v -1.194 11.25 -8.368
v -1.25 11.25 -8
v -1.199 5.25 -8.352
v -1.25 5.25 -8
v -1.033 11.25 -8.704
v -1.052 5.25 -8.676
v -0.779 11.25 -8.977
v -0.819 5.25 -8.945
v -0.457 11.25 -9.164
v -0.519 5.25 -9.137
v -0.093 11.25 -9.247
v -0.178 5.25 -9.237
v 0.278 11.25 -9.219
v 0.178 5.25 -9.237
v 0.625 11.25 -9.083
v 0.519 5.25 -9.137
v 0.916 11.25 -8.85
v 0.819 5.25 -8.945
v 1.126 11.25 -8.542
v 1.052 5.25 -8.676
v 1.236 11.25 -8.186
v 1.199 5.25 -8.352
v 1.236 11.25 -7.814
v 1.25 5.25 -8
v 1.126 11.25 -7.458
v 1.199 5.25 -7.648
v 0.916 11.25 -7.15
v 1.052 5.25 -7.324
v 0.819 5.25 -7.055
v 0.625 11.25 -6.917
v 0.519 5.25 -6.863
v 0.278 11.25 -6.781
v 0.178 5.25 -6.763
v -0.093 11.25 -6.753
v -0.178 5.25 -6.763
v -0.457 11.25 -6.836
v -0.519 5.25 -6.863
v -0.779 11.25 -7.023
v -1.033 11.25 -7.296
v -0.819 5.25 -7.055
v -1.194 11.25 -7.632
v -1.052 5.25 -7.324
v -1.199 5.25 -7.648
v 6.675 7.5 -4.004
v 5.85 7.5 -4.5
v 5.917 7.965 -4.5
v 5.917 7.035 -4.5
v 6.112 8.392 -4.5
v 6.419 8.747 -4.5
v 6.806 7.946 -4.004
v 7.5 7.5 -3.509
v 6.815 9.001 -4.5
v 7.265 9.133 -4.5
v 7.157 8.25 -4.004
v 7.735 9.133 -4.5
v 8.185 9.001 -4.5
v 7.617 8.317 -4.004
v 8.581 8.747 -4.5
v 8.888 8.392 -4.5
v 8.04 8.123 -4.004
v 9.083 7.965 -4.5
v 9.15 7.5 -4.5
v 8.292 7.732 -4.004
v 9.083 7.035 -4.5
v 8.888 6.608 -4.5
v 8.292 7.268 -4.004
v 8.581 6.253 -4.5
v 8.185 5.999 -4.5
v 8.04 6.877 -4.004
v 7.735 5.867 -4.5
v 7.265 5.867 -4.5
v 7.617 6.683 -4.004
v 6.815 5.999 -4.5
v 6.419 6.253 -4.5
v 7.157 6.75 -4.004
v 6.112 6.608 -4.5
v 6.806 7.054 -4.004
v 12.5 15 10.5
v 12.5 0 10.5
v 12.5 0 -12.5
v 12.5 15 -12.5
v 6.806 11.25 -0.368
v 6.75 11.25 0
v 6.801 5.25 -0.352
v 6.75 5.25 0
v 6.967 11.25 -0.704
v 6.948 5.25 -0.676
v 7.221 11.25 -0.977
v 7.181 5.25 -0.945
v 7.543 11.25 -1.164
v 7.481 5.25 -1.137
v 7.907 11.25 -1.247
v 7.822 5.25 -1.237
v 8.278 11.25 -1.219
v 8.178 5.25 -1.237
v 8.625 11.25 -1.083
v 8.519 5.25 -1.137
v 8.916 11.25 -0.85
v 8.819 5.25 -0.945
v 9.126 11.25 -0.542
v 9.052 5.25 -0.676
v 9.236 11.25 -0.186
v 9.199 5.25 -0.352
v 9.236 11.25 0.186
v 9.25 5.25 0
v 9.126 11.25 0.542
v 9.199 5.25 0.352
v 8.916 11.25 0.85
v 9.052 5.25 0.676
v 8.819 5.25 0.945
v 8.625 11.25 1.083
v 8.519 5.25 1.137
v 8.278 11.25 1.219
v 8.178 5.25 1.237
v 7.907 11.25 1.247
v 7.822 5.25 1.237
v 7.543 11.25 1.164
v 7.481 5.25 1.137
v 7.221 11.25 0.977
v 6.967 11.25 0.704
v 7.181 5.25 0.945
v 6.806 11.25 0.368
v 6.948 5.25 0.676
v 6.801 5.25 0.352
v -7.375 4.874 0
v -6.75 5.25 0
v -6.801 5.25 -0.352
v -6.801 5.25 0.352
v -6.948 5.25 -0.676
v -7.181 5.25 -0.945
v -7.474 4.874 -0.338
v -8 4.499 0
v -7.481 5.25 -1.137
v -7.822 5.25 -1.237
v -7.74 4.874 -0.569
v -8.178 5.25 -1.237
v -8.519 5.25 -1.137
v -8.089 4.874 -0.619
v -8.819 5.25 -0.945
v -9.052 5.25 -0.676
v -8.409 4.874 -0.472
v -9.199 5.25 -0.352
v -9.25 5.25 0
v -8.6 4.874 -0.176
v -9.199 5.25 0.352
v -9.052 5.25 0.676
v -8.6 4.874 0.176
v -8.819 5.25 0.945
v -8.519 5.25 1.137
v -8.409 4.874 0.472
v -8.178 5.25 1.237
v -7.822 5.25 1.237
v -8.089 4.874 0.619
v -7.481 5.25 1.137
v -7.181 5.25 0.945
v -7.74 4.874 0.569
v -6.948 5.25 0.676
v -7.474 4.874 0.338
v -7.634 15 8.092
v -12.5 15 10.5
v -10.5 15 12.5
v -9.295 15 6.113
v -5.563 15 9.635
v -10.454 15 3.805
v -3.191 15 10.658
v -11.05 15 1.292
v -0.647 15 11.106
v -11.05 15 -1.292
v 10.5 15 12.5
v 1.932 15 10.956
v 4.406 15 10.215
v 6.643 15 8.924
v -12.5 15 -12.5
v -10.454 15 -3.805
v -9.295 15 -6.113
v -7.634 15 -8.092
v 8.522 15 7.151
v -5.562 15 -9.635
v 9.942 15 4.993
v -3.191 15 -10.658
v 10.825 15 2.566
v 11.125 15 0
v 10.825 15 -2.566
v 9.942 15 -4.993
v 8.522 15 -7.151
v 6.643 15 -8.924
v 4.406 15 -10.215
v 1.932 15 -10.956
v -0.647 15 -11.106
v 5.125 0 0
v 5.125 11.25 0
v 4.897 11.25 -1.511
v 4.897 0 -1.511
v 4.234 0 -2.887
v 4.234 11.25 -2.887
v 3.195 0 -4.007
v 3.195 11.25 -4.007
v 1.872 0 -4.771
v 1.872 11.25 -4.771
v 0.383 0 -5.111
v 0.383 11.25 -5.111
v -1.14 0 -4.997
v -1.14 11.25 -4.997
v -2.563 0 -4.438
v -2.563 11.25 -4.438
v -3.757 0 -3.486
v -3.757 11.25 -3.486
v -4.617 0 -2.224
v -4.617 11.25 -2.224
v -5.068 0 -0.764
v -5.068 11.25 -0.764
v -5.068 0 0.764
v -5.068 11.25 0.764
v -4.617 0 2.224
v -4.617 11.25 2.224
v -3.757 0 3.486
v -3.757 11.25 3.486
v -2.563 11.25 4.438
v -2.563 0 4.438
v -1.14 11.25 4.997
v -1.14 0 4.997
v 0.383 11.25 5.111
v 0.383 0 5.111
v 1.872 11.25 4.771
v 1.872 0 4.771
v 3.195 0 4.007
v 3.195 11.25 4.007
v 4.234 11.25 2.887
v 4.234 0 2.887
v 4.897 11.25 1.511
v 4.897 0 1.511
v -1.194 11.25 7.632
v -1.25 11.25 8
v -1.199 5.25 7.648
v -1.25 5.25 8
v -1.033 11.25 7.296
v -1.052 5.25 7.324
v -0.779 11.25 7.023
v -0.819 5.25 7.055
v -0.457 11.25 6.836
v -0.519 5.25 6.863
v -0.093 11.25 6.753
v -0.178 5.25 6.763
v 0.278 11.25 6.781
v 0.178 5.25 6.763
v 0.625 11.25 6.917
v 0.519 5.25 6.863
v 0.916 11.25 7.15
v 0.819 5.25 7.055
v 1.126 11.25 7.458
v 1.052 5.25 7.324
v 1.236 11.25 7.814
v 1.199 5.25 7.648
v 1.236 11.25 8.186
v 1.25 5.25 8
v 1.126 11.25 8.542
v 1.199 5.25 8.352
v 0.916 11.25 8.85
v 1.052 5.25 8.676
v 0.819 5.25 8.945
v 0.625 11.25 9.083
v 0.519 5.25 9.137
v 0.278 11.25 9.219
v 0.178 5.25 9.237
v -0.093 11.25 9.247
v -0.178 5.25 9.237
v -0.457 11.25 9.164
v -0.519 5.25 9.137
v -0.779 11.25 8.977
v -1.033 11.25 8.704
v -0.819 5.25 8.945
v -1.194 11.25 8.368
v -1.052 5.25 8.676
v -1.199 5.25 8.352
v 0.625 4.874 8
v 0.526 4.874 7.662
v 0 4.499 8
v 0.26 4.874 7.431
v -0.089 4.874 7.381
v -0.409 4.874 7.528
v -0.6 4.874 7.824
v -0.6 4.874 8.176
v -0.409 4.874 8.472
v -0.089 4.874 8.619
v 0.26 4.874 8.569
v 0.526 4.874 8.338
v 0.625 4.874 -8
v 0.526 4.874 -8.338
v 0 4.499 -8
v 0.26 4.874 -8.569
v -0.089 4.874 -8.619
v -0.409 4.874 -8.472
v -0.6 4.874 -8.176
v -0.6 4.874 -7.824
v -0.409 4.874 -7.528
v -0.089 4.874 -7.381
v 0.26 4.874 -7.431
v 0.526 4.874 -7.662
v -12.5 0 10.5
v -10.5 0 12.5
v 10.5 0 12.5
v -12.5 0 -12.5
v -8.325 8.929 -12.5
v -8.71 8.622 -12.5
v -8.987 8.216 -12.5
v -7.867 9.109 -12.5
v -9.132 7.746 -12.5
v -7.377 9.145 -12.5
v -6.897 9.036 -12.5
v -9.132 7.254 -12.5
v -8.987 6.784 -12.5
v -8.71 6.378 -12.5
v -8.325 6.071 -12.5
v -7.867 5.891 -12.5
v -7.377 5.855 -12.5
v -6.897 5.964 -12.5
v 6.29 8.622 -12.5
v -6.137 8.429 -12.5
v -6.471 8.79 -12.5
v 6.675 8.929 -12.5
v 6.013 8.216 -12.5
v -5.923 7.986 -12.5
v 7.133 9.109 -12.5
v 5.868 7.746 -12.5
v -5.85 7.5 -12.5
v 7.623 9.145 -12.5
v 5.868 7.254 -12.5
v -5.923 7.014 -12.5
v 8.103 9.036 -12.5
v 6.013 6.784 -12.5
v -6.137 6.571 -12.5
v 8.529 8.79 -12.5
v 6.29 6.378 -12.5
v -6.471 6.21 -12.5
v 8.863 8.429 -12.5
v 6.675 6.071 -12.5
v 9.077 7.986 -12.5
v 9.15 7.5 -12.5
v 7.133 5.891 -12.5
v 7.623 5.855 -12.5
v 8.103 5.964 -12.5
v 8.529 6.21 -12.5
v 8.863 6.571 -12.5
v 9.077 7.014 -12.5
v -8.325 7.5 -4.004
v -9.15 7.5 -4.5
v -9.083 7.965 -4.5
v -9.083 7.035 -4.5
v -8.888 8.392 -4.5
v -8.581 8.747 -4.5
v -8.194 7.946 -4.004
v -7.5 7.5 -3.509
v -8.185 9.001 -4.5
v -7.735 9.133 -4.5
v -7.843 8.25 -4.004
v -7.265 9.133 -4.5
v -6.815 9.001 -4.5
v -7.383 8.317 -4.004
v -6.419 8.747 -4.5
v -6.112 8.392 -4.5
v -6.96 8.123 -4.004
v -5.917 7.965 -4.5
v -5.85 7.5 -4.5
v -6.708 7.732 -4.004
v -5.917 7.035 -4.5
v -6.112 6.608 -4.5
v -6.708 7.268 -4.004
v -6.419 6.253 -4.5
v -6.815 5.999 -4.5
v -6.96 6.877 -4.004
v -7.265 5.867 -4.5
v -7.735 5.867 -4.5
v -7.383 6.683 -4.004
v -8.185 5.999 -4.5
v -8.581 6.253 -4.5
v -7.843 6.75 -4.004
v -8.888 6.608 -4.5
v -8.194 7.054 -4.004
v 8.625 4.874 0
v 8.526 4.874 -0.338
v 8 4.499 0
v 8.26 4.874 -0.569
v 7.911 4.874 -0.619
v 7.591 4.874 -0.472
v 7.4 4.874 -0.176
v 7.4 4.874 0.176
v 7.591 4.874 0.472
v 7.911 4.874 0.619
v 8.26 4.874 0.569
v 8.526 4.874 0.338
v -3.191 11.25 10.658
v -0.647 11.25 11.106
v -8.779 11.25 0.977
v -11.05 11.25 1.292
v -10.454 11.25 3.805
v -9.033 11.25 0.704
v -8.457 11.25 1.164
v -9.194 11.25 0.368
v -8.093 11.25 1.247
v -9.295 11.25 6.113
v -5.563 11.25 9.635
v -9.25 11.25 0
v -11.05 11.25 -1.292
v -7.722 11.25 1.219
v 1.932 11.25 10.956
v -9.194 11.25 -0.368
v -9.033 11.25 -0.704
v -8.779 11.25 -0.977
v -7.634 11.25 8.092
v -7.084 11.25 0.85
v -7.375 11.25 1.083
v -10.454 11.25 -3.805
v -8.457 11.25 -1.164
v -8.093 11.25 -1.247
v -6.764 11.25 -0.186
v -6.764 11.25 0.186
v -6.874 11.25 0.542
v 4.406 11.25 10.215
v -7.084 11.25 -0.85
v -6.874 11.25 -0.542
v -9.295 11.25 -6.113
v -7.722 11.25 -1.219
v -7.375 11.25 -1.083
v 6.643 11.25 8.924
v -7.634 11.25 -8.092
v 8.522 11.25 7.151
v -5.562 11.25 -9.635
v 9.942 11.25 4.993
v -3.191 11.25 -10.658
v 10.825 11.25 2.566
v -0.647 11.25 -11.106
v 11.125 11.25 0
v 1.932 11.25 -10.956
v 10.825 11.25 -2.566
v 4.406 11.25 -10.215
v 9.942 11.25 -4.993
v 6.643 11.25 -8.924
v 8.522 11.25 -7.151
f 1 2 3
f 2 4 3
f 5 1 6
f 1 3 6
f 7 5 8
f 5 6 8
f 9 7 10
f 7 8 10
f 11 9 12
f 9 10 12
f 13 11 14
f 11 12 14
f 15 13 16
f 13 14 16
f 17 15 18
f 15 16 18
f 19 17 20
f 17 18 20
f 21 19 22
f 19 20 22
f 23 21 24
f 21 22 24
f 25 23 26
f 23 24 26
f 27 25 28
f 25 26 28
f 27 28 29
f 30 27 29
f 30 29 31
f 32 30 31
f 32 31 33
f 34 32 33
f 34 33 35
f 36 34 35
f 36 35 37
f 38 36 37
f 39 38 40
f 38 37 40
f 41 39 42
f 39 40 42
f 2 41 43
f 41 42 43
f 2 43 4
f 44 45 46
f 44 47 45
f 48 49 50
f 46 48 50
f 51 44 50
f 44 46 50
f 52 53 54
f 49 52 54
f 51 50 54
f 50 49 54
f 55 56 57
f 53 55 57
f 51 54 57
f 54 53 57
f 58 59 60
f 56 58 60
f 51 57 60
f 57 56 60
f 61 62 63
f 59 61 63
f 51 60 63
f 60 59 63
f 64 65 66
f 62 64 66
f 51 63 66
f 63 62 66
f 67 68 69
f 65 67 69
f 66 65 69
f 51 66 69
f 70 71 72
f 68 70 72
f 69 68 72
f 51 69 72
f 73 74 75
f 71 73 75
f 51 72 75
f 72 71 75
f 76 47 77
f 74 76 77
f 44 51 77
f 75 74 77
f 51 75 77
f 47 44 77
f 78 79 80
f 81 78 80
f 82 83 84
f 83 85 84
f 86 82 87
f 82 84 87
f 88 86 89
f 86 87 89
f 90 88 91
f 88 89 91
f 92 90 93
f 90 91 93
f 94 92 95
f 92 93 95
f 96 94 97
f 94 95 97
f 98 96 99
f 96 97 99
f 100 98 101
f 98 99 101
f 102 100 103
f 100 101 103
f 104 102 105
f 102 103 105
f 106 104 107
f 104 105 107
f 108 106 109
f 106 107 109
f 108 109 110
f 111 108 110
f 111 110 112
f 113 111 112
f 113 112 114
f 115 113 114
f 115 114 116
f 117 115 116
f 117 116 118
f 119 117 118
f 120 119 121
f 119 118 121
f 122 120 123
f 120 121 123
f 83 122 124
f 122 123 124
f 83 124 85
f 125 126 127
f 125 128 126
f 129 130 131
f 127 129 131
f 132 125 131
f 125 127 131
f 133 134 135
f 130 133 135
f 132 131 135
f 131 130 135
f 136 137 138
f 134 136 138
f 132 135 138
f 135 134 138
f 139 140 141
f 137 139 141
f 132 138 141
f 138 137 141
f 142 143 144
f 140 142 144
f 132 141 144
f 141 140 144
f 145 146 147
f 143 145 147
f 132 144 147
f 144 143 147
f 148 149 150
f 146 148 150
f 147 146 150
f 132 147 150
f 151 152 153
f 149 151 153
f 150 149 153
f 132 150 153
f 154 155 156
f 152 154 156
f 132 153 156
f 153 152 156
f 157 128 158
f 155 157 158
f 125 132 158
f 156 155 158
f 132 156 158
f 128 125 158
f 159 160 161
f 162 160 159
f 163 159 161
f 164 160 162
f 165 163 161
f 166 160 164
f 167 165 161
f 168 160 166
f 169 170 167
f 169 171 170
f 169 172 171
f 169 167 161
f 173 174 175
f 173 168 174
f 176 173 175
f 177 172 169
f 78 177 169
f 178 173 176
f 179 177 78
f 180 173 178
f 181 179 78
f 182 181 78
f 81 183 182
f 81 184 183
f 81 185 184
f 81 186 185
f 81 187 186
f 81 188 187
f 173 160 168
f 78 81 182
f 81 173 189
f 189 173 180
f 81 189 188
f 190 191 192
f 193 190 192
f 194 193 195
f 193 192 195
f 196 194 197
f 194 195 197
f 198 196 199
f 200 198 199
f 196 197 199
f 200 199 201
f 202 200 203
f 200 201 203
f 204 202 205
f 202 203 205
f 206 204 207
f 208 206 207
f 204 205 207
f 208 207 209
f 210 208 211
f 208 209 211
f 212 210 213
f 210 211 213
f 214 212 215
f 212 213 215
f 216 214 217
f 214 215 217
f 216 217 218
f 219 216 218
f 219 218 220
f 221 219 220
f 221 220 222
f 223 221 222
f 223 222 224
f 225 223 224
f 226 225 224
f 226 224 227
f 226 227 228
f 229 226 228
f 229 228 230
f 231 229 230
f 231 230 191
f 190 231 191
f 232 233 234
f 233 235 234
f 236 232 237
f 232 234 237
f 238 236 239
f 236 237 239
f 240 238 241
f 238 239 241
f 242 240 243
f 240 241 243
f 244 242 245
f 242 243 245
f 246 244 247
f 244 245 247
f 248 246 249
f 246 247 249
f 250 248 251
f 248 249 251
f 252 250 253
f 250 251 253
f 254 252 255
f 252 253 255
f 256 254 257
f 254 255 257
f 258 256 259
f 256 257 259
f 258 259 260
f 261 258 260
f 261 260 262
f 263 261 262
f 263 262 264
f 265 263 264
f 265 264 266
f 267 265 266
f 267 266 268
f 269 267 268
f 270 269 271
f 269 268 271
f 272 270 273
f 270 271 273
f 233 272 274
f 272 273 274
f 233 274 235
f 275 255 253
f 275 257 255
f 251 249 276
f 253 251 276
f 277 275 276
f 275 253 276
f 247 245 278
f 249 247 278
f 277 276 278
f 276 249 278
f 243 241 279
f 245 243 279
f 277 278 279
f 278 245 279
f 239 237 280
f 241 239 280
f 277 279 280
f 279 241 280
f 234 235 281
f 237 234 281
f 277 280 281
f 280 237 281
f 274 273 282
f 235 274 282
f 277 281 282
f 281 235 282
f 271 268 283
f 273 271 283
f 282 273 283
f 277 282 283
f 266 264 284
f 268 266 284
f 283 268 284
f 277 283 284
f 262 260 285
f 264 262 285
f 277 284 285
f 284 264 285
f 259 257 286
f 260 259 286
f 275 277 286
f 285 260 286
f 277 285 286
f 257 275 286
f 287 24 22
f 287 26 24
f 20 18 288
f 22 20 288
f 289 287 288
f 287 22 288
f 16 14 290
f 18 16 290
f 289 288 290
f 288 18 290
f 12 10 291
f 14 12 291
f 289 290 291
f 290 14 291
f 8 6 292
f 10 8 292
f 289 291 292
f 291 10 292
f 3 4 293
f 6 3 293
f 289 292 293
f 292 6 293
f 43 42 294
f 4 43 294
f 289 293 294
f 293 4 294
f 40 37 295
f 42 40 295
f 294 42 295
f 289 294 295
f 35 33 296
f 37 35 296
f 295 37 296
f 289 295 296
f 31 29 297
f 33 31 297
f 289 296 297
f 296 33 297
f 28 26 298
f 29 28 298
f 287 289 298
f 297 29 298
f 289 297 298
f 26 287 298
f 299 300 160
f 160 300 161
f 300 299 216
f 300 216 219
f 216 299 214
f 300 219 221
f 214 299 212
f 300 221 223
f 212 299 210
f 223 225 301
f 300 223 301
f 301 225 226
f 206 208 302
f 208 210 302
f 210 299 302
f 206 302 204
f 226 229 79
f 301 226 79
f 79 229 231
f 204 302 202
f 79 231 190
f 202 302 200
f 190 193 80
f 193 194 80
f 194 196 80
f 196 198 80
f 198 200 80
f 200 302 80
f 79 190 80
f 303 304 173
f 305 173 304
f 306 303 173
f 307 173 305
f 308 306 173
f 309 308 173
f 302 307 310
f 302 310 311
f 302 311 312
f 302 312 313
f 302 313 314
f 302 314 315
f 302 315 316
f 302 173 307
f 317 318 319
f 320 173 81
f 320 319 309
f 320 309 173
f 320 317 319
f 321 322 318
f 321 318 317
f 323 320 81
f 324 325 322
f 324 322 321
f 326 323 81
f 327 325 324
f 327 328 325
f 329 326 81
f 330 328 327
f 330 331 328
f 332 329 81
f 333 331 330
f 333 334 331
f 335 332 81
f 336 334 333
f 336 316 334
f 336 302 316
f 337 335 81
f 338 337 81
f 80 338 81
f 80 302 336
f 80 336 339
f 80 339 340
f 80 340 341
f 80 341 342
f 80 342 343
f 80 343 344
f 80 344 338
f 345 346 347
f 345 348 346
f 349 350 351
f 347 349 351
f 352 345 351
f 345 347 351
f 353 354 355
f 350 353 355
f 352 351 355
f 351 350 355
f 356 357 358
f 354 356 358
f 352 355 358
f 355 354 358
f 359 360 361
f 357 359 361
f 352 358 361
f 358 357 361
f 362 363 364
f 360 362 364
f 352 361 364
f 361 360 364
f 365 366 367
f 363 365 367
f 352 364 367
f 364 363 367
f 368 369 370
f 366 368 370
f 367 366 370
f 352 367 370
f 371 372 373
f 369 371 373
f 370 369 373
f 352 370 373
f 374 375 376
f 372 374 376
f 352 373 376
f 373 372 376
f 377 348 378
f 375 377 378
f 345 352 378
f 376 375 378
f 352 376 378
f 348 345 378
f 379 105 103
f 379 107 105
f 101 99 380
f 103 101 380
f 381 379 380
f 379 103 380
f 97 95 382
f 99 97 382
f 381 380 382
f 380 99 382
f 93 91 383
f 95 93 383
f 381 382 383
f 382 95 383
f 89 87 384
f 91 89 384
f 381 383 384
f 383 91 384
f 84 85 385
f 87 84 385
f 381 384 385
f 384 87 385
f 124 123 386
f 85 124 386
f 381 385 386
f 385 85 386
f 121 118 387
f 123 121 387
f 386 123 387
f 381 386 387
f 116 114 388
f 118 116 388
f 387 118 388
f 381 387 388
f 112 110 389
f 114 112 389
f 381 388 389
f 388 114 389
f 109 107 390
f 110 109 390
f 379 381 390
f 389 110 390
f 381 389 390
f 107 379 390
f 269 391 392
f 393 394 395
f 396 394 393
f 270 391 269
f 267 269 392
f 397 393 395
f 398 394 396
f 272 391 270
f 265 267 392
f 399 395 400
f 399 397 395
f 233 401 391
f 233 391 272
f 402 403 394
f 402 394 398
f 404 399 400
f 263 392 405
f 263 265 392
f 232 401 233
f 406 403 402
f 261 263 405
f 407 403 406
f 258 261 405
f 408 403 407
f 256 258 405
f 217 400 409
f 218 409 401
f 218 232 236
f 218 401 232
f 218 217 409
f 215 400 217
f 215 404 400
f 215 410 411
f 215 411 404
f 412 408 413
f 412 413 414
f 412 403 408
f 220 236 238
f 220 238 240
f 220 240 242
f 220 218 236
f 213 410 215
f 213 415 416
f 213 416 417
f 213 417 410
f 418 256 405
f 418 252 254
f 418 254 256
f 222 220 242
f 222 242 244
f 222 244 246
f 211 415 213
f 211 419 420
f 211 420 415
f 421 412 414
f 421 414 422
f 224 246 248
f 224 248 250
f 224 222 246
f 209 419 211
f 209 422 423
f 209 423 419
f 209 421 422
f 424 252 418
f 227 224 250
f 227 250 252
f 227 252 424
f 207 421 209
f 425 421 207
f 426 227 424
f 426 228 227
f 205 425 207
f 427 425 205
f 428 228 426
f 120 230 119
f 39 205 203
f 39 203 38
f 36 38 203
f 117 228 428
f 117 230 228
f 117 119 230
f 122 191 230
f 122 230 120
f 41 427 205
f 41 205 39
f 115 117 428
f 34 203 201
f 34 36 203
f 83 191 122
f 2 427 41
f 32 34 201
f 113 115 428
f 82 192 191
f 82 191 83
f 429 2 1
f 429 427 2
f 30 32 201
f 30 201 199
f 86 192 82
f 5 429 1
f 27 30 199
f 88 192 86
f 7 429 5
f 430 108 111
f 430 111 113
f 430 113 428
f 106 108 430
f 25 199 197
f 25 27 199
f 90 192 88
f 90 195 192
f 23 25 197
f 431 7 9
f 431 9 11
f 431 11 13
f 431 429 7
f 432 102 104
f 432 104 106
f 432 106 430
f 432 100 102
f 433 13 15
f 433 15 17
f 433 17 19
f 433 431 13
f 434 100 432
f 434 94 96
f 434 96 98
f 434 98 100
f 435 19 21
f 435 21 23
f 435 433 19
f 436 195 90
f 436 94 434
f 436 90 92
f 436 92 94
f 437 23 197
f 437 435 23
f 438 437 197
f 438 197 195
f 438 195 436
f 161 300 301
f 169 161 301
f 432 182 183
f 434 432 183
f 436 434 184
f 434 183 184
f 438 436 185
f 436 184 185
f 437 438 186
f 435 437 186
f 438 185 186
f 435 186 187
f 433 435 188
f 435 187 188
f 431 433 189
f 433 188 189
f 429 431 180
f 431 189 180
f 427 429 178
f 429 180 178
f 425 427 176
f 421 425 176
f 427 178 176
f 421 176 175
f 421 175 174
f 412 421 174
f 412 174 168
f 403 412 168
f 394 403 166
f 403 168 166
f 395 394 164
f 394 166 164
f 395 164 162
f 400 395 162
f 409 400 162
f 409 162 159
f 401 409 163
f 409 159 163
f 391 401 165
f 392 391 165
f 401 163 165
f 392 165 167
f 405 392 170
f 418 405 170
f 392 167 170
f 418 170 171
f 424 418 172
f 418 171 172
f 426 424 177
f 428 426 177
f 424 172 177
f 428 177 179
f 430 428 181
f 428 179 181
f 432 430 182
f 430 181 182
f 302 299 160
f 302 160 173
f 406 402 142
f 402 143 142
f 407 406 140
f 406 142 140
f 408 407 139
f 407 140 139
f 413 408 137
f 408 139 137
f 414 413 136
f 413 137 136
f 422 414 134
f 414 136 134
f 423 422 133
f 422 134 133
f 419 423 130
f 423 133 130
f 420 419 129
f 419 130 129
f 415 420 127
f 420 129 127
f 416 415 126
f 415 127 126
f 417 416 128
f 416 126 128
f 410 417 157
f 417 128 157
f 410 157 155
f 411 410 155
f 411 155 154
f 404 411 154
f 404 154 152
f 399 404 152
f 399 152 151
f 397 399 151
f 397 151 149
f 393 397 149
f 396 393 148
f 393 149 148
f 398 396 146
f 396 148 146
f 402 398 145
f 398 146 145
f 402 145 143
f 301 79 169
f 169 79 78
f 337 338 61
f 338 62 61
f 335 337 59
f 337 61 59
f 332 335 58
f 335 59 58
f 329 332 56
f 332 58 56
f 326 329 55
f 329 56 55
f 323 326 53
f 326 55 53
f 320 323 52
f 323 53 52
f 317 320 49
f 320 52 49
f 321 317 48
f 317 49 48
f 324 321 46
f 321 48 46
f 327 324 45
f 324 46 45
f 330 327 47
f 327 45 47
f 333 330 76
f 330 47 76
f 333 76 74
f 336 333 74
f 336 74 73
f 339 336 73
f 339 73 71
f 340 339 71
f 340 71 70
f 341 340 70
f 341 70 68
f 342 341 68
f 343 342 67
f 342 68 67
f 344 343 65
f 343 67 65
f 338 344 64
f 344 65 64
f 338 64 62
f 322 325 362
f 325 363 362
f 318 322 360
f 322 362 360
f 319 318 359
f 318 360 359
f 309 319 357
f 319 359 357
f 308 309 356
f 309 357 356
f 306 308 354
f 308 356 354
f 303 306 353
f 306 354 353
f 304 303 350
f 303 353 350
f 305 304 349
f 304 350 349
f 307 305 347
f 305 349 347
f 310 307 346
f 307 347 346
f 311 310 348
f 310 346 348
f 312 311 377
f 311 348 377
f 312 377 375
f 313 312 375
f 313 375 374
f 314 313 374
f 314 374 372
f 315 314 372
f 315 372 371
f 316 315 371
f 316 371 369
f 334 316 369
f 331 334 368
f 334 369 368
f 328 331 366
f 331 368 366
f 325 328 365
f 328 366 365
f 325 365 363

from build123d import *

# Parameters (mm, degrees)
SKETCH1_W                 = 25
SKETCH1_H                 = 25
BOSS_EXTRUDE1_DEPTH       = 15
SKETCH2_R                 = 11.125
CUT_EXTRUDE1_DEPTH        = 3.75
SKETCH3_R                 = 5.125
CUT_EXTRUDE2_DEPTH        = 12.25
M3X0_5_TAPPED_HOLE1_D     = 2.5
M3X0_5_TAPPED_HOLE1_DEPTH = 6
M3X0_5_TAPPED_HOLE1_TIP   = 0.751075774
M4X0_7_TAPPED_HOLE1_D     = 3.3
M4X0_7_TAPPED_HOLE1_DEPTH = 8
M4X0_7_TAPPED_HOLE1_TIP   = 0.991420021
CHAMFER1_SIZE             = 2


with BuildPart() as part:
    # Sketch1 → Boss-Extrude1 (new body)
    with BuildSketch(Plane(origin=(0, 0, 0), x_dir=(1, 0, 0), z_dir=(0, 1, 0))):
        Rectangle(SKETCH1_W, SKETCH1_H)
    extrude(amount=BOSS_EXTRUDE1_DEPTH)

    # Sketch2 → Cut-Extrude1 (cut)
    with BuildSketch(Plane(origin=(0, 15, 0), x_dir=(1, 0, 0), z_dir=(0, 1, 0))):
        Circle(SKETCH2_R)
    extrude(amount=-CUT_EXTRUDE1_DEPTH, mode=Mode.SUBTRACT)

    # Sketch3 → Cut-Extrude2 (cut, through all)
    with BuildSketch(Plane(origin=(0, 11.25, 0), x_dir=(1, 0, 0), z_dir=(0, 1, 0))):
        Circle(SKETCH3_R)
    extrude(amount=-CUT_EXTRUDE2_DEPTH, mode=Mode.SUBTRACT)

    # M3x0.5 Tapped Hole1
    with Locations(Plane(origin=(0, 11.25, 0), x_dir=(1, 0, 0), z_dir=(0, 1, 0))):
        with Locations((-8, 0), (8, 0), (0, 8), (0, -8)):
            Hole(M3X0_5_TAPPED_HOLE1_D / 2, depth=M3X0_5_TAPPED_HOLE1_DEPTH)
            with Locations((0, 0, -(M3X0_5_TAPPED_HOLE1_DEPTH + M3X0_5_TAPPED_HOLE1_TIP / 2))):  # 118° drill point
                Cone(0, M3X0_5_TAPPED_HOLE1_D / 2, M3X0_5_TAPPED_HOLE1_TIP, mode=Mode.SUBTRACT)

    # M4x0.7 Tapped Hole1
    with Locations(Plane(origin=(0, 0, -12.5), x_dir=(-1, 0, 0), z_dir=(0, 0, -1))):
        with Locations((-7.5, 7.5), (7.5, 7.5)):
            Hole(M4X0_7_TAPPED_HOLE1_D / 2, depth=M4X0_7_TAPPED_HOLE1_DEPTH)
            with Locations((0, 0, -(M4X0_7_TAPPED_HOLE1_DEPTH + M4X0_7_TAPPED_HOLE1_TIP / 2))):  # 118° drill point
                Cone(0, M4X0_7_TAPPED_HOLE1_D / 2, M4X0_7_TAPPED_HOLE1_TIP, mode=Mode.SUBTRACT)

    # Chamfer1
    chamfer1_edges = [part.edges().sort_by_distance(p)[0] for p in [
        (12.5, 7.5, 12.5),
        (-12.5, 7.5, 12.5),
    ]]
    chamfer(chamfer1_edges, length=CHAMFER1_SIZE)


solid = part.part
